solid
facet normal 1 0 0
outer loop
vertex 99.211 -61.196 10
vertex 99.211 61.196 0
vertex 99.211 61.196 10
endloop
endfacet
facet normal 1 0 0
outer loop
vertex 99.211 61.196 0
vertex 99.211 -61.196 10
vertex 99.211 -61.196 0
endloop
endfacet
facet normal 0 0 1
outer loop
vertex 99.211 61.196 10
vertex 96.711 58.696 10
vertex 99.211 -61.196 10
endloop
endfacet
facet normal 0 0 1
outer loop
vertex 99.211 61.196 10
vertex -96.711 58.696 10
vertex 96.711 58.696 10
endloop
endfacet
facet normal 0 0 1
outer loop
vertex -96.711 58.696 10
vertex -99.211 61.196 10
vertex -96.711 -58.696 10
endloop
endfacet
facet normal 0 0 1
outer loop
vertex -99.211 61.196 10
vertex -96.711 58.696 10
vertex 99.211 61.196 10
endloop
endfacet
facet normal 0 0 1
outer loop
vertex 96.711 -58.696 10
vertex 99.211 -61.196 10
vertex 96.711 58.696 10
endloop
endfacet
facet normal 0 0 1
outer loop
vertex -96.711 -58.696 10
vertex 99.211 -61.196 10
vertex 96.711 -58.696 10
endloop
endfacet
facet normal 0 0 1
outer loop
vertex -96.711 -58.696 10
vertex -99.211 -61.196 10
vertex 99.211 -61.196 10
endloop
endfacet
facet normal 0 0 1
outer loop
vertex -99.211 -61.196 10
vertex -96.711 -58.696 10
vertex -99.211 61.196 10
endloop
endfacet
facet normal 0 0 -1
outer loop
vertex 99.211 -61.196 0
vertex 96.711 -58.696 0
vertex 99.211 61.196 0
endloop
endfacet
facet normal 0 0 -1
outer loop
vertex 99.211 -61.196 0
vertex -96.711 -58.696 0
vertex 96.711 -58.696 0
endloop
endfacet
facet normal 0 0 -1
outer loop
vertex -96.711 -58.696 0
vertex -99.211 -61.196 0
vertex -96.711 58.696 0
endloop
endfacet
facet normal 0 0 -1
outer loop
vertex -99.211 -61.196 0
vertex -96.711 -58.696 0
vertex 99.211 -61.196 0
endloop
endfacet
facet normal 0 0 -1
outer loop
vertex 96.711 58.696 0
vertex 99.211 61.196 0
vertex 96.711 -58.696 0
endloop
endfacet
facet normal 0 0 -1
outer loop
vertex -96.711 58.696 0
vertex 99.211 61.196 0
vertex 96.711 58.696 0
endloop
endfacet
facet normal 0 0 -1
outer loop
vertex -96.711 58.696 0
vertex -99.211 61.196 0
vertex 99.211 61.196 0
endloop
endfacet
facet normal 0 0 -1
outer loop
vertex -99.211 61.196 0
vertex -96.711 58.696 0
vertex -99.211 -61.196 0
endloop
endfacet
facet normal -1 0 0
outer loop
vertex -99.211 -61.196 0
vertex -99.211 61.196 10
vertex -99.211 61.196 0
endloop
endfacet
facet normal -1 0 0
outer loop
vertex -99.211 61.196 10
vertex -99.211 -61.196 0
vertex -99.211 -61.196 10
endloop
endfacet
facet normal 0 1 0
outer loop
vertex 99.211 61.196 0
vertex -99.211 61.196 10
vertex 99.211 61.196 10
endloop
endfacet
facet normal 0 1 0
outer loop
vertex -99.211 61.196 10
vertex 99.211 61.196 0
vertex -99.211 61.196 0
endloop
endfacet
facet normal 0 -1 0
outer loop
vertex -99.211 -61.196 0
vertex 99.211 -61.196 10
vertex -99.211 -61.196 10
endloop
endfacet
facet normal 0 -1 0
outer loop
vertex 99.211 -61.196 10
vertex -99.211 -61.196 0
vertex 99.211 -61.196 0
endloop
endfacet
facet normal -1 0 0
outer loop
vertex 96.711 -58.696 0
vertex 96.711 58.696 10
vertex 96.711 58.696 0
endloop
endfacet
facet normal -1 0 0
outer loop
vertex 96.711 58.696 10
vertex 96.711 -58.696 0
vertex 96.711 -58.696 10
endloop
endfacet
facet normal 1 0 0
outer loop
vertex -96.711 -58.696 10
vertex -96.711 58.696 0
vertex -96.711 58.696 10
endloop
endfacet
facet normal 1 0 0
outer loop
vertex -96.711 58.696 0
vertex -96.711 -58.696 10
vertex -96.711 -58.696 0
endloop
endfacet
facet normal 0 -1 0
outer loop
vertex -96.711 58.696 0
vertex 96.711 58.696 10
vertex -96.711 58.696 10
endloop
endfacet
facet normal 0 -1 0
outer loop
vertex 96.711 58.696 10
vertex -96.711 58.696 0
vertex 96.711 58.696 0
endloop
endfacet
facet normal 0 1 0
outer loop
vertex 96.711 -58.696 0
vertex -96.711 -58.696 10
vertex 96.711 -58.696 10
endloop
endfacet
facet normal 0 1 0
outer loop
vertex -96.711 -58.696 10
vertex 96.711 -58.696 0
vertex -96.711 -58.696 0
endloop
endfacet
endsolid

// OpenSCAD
// file: dimensions.scad
function plate_width() = 193.422;
function plate_height() = 117.392;
function plate_thickness() = 3;
function separation() = 5;
function led_width() = 10;
function led_height() = 2.5;
function hole_radius() = 1.5;
function hole_offset() = 3.5 + hole_radius();
function separator_thickness() = (led_width()-plate_thickness())/2;

function electronics_width() = 81.3;
function electronics_height() = 50.7;
function electronics_thickness() = 23;
// main file
use <dimensions.scad>

module led_strip() {
    translate([0, 0, led_width()/2])
    difference() {
        cube([plate_width() + led_height() * 2, plate_height() + led_height() * 2, led_width()], center=true);
        cube([plate_width(), plate_height(), led_width() * 2], center=true);
    }
}

led_strip();
